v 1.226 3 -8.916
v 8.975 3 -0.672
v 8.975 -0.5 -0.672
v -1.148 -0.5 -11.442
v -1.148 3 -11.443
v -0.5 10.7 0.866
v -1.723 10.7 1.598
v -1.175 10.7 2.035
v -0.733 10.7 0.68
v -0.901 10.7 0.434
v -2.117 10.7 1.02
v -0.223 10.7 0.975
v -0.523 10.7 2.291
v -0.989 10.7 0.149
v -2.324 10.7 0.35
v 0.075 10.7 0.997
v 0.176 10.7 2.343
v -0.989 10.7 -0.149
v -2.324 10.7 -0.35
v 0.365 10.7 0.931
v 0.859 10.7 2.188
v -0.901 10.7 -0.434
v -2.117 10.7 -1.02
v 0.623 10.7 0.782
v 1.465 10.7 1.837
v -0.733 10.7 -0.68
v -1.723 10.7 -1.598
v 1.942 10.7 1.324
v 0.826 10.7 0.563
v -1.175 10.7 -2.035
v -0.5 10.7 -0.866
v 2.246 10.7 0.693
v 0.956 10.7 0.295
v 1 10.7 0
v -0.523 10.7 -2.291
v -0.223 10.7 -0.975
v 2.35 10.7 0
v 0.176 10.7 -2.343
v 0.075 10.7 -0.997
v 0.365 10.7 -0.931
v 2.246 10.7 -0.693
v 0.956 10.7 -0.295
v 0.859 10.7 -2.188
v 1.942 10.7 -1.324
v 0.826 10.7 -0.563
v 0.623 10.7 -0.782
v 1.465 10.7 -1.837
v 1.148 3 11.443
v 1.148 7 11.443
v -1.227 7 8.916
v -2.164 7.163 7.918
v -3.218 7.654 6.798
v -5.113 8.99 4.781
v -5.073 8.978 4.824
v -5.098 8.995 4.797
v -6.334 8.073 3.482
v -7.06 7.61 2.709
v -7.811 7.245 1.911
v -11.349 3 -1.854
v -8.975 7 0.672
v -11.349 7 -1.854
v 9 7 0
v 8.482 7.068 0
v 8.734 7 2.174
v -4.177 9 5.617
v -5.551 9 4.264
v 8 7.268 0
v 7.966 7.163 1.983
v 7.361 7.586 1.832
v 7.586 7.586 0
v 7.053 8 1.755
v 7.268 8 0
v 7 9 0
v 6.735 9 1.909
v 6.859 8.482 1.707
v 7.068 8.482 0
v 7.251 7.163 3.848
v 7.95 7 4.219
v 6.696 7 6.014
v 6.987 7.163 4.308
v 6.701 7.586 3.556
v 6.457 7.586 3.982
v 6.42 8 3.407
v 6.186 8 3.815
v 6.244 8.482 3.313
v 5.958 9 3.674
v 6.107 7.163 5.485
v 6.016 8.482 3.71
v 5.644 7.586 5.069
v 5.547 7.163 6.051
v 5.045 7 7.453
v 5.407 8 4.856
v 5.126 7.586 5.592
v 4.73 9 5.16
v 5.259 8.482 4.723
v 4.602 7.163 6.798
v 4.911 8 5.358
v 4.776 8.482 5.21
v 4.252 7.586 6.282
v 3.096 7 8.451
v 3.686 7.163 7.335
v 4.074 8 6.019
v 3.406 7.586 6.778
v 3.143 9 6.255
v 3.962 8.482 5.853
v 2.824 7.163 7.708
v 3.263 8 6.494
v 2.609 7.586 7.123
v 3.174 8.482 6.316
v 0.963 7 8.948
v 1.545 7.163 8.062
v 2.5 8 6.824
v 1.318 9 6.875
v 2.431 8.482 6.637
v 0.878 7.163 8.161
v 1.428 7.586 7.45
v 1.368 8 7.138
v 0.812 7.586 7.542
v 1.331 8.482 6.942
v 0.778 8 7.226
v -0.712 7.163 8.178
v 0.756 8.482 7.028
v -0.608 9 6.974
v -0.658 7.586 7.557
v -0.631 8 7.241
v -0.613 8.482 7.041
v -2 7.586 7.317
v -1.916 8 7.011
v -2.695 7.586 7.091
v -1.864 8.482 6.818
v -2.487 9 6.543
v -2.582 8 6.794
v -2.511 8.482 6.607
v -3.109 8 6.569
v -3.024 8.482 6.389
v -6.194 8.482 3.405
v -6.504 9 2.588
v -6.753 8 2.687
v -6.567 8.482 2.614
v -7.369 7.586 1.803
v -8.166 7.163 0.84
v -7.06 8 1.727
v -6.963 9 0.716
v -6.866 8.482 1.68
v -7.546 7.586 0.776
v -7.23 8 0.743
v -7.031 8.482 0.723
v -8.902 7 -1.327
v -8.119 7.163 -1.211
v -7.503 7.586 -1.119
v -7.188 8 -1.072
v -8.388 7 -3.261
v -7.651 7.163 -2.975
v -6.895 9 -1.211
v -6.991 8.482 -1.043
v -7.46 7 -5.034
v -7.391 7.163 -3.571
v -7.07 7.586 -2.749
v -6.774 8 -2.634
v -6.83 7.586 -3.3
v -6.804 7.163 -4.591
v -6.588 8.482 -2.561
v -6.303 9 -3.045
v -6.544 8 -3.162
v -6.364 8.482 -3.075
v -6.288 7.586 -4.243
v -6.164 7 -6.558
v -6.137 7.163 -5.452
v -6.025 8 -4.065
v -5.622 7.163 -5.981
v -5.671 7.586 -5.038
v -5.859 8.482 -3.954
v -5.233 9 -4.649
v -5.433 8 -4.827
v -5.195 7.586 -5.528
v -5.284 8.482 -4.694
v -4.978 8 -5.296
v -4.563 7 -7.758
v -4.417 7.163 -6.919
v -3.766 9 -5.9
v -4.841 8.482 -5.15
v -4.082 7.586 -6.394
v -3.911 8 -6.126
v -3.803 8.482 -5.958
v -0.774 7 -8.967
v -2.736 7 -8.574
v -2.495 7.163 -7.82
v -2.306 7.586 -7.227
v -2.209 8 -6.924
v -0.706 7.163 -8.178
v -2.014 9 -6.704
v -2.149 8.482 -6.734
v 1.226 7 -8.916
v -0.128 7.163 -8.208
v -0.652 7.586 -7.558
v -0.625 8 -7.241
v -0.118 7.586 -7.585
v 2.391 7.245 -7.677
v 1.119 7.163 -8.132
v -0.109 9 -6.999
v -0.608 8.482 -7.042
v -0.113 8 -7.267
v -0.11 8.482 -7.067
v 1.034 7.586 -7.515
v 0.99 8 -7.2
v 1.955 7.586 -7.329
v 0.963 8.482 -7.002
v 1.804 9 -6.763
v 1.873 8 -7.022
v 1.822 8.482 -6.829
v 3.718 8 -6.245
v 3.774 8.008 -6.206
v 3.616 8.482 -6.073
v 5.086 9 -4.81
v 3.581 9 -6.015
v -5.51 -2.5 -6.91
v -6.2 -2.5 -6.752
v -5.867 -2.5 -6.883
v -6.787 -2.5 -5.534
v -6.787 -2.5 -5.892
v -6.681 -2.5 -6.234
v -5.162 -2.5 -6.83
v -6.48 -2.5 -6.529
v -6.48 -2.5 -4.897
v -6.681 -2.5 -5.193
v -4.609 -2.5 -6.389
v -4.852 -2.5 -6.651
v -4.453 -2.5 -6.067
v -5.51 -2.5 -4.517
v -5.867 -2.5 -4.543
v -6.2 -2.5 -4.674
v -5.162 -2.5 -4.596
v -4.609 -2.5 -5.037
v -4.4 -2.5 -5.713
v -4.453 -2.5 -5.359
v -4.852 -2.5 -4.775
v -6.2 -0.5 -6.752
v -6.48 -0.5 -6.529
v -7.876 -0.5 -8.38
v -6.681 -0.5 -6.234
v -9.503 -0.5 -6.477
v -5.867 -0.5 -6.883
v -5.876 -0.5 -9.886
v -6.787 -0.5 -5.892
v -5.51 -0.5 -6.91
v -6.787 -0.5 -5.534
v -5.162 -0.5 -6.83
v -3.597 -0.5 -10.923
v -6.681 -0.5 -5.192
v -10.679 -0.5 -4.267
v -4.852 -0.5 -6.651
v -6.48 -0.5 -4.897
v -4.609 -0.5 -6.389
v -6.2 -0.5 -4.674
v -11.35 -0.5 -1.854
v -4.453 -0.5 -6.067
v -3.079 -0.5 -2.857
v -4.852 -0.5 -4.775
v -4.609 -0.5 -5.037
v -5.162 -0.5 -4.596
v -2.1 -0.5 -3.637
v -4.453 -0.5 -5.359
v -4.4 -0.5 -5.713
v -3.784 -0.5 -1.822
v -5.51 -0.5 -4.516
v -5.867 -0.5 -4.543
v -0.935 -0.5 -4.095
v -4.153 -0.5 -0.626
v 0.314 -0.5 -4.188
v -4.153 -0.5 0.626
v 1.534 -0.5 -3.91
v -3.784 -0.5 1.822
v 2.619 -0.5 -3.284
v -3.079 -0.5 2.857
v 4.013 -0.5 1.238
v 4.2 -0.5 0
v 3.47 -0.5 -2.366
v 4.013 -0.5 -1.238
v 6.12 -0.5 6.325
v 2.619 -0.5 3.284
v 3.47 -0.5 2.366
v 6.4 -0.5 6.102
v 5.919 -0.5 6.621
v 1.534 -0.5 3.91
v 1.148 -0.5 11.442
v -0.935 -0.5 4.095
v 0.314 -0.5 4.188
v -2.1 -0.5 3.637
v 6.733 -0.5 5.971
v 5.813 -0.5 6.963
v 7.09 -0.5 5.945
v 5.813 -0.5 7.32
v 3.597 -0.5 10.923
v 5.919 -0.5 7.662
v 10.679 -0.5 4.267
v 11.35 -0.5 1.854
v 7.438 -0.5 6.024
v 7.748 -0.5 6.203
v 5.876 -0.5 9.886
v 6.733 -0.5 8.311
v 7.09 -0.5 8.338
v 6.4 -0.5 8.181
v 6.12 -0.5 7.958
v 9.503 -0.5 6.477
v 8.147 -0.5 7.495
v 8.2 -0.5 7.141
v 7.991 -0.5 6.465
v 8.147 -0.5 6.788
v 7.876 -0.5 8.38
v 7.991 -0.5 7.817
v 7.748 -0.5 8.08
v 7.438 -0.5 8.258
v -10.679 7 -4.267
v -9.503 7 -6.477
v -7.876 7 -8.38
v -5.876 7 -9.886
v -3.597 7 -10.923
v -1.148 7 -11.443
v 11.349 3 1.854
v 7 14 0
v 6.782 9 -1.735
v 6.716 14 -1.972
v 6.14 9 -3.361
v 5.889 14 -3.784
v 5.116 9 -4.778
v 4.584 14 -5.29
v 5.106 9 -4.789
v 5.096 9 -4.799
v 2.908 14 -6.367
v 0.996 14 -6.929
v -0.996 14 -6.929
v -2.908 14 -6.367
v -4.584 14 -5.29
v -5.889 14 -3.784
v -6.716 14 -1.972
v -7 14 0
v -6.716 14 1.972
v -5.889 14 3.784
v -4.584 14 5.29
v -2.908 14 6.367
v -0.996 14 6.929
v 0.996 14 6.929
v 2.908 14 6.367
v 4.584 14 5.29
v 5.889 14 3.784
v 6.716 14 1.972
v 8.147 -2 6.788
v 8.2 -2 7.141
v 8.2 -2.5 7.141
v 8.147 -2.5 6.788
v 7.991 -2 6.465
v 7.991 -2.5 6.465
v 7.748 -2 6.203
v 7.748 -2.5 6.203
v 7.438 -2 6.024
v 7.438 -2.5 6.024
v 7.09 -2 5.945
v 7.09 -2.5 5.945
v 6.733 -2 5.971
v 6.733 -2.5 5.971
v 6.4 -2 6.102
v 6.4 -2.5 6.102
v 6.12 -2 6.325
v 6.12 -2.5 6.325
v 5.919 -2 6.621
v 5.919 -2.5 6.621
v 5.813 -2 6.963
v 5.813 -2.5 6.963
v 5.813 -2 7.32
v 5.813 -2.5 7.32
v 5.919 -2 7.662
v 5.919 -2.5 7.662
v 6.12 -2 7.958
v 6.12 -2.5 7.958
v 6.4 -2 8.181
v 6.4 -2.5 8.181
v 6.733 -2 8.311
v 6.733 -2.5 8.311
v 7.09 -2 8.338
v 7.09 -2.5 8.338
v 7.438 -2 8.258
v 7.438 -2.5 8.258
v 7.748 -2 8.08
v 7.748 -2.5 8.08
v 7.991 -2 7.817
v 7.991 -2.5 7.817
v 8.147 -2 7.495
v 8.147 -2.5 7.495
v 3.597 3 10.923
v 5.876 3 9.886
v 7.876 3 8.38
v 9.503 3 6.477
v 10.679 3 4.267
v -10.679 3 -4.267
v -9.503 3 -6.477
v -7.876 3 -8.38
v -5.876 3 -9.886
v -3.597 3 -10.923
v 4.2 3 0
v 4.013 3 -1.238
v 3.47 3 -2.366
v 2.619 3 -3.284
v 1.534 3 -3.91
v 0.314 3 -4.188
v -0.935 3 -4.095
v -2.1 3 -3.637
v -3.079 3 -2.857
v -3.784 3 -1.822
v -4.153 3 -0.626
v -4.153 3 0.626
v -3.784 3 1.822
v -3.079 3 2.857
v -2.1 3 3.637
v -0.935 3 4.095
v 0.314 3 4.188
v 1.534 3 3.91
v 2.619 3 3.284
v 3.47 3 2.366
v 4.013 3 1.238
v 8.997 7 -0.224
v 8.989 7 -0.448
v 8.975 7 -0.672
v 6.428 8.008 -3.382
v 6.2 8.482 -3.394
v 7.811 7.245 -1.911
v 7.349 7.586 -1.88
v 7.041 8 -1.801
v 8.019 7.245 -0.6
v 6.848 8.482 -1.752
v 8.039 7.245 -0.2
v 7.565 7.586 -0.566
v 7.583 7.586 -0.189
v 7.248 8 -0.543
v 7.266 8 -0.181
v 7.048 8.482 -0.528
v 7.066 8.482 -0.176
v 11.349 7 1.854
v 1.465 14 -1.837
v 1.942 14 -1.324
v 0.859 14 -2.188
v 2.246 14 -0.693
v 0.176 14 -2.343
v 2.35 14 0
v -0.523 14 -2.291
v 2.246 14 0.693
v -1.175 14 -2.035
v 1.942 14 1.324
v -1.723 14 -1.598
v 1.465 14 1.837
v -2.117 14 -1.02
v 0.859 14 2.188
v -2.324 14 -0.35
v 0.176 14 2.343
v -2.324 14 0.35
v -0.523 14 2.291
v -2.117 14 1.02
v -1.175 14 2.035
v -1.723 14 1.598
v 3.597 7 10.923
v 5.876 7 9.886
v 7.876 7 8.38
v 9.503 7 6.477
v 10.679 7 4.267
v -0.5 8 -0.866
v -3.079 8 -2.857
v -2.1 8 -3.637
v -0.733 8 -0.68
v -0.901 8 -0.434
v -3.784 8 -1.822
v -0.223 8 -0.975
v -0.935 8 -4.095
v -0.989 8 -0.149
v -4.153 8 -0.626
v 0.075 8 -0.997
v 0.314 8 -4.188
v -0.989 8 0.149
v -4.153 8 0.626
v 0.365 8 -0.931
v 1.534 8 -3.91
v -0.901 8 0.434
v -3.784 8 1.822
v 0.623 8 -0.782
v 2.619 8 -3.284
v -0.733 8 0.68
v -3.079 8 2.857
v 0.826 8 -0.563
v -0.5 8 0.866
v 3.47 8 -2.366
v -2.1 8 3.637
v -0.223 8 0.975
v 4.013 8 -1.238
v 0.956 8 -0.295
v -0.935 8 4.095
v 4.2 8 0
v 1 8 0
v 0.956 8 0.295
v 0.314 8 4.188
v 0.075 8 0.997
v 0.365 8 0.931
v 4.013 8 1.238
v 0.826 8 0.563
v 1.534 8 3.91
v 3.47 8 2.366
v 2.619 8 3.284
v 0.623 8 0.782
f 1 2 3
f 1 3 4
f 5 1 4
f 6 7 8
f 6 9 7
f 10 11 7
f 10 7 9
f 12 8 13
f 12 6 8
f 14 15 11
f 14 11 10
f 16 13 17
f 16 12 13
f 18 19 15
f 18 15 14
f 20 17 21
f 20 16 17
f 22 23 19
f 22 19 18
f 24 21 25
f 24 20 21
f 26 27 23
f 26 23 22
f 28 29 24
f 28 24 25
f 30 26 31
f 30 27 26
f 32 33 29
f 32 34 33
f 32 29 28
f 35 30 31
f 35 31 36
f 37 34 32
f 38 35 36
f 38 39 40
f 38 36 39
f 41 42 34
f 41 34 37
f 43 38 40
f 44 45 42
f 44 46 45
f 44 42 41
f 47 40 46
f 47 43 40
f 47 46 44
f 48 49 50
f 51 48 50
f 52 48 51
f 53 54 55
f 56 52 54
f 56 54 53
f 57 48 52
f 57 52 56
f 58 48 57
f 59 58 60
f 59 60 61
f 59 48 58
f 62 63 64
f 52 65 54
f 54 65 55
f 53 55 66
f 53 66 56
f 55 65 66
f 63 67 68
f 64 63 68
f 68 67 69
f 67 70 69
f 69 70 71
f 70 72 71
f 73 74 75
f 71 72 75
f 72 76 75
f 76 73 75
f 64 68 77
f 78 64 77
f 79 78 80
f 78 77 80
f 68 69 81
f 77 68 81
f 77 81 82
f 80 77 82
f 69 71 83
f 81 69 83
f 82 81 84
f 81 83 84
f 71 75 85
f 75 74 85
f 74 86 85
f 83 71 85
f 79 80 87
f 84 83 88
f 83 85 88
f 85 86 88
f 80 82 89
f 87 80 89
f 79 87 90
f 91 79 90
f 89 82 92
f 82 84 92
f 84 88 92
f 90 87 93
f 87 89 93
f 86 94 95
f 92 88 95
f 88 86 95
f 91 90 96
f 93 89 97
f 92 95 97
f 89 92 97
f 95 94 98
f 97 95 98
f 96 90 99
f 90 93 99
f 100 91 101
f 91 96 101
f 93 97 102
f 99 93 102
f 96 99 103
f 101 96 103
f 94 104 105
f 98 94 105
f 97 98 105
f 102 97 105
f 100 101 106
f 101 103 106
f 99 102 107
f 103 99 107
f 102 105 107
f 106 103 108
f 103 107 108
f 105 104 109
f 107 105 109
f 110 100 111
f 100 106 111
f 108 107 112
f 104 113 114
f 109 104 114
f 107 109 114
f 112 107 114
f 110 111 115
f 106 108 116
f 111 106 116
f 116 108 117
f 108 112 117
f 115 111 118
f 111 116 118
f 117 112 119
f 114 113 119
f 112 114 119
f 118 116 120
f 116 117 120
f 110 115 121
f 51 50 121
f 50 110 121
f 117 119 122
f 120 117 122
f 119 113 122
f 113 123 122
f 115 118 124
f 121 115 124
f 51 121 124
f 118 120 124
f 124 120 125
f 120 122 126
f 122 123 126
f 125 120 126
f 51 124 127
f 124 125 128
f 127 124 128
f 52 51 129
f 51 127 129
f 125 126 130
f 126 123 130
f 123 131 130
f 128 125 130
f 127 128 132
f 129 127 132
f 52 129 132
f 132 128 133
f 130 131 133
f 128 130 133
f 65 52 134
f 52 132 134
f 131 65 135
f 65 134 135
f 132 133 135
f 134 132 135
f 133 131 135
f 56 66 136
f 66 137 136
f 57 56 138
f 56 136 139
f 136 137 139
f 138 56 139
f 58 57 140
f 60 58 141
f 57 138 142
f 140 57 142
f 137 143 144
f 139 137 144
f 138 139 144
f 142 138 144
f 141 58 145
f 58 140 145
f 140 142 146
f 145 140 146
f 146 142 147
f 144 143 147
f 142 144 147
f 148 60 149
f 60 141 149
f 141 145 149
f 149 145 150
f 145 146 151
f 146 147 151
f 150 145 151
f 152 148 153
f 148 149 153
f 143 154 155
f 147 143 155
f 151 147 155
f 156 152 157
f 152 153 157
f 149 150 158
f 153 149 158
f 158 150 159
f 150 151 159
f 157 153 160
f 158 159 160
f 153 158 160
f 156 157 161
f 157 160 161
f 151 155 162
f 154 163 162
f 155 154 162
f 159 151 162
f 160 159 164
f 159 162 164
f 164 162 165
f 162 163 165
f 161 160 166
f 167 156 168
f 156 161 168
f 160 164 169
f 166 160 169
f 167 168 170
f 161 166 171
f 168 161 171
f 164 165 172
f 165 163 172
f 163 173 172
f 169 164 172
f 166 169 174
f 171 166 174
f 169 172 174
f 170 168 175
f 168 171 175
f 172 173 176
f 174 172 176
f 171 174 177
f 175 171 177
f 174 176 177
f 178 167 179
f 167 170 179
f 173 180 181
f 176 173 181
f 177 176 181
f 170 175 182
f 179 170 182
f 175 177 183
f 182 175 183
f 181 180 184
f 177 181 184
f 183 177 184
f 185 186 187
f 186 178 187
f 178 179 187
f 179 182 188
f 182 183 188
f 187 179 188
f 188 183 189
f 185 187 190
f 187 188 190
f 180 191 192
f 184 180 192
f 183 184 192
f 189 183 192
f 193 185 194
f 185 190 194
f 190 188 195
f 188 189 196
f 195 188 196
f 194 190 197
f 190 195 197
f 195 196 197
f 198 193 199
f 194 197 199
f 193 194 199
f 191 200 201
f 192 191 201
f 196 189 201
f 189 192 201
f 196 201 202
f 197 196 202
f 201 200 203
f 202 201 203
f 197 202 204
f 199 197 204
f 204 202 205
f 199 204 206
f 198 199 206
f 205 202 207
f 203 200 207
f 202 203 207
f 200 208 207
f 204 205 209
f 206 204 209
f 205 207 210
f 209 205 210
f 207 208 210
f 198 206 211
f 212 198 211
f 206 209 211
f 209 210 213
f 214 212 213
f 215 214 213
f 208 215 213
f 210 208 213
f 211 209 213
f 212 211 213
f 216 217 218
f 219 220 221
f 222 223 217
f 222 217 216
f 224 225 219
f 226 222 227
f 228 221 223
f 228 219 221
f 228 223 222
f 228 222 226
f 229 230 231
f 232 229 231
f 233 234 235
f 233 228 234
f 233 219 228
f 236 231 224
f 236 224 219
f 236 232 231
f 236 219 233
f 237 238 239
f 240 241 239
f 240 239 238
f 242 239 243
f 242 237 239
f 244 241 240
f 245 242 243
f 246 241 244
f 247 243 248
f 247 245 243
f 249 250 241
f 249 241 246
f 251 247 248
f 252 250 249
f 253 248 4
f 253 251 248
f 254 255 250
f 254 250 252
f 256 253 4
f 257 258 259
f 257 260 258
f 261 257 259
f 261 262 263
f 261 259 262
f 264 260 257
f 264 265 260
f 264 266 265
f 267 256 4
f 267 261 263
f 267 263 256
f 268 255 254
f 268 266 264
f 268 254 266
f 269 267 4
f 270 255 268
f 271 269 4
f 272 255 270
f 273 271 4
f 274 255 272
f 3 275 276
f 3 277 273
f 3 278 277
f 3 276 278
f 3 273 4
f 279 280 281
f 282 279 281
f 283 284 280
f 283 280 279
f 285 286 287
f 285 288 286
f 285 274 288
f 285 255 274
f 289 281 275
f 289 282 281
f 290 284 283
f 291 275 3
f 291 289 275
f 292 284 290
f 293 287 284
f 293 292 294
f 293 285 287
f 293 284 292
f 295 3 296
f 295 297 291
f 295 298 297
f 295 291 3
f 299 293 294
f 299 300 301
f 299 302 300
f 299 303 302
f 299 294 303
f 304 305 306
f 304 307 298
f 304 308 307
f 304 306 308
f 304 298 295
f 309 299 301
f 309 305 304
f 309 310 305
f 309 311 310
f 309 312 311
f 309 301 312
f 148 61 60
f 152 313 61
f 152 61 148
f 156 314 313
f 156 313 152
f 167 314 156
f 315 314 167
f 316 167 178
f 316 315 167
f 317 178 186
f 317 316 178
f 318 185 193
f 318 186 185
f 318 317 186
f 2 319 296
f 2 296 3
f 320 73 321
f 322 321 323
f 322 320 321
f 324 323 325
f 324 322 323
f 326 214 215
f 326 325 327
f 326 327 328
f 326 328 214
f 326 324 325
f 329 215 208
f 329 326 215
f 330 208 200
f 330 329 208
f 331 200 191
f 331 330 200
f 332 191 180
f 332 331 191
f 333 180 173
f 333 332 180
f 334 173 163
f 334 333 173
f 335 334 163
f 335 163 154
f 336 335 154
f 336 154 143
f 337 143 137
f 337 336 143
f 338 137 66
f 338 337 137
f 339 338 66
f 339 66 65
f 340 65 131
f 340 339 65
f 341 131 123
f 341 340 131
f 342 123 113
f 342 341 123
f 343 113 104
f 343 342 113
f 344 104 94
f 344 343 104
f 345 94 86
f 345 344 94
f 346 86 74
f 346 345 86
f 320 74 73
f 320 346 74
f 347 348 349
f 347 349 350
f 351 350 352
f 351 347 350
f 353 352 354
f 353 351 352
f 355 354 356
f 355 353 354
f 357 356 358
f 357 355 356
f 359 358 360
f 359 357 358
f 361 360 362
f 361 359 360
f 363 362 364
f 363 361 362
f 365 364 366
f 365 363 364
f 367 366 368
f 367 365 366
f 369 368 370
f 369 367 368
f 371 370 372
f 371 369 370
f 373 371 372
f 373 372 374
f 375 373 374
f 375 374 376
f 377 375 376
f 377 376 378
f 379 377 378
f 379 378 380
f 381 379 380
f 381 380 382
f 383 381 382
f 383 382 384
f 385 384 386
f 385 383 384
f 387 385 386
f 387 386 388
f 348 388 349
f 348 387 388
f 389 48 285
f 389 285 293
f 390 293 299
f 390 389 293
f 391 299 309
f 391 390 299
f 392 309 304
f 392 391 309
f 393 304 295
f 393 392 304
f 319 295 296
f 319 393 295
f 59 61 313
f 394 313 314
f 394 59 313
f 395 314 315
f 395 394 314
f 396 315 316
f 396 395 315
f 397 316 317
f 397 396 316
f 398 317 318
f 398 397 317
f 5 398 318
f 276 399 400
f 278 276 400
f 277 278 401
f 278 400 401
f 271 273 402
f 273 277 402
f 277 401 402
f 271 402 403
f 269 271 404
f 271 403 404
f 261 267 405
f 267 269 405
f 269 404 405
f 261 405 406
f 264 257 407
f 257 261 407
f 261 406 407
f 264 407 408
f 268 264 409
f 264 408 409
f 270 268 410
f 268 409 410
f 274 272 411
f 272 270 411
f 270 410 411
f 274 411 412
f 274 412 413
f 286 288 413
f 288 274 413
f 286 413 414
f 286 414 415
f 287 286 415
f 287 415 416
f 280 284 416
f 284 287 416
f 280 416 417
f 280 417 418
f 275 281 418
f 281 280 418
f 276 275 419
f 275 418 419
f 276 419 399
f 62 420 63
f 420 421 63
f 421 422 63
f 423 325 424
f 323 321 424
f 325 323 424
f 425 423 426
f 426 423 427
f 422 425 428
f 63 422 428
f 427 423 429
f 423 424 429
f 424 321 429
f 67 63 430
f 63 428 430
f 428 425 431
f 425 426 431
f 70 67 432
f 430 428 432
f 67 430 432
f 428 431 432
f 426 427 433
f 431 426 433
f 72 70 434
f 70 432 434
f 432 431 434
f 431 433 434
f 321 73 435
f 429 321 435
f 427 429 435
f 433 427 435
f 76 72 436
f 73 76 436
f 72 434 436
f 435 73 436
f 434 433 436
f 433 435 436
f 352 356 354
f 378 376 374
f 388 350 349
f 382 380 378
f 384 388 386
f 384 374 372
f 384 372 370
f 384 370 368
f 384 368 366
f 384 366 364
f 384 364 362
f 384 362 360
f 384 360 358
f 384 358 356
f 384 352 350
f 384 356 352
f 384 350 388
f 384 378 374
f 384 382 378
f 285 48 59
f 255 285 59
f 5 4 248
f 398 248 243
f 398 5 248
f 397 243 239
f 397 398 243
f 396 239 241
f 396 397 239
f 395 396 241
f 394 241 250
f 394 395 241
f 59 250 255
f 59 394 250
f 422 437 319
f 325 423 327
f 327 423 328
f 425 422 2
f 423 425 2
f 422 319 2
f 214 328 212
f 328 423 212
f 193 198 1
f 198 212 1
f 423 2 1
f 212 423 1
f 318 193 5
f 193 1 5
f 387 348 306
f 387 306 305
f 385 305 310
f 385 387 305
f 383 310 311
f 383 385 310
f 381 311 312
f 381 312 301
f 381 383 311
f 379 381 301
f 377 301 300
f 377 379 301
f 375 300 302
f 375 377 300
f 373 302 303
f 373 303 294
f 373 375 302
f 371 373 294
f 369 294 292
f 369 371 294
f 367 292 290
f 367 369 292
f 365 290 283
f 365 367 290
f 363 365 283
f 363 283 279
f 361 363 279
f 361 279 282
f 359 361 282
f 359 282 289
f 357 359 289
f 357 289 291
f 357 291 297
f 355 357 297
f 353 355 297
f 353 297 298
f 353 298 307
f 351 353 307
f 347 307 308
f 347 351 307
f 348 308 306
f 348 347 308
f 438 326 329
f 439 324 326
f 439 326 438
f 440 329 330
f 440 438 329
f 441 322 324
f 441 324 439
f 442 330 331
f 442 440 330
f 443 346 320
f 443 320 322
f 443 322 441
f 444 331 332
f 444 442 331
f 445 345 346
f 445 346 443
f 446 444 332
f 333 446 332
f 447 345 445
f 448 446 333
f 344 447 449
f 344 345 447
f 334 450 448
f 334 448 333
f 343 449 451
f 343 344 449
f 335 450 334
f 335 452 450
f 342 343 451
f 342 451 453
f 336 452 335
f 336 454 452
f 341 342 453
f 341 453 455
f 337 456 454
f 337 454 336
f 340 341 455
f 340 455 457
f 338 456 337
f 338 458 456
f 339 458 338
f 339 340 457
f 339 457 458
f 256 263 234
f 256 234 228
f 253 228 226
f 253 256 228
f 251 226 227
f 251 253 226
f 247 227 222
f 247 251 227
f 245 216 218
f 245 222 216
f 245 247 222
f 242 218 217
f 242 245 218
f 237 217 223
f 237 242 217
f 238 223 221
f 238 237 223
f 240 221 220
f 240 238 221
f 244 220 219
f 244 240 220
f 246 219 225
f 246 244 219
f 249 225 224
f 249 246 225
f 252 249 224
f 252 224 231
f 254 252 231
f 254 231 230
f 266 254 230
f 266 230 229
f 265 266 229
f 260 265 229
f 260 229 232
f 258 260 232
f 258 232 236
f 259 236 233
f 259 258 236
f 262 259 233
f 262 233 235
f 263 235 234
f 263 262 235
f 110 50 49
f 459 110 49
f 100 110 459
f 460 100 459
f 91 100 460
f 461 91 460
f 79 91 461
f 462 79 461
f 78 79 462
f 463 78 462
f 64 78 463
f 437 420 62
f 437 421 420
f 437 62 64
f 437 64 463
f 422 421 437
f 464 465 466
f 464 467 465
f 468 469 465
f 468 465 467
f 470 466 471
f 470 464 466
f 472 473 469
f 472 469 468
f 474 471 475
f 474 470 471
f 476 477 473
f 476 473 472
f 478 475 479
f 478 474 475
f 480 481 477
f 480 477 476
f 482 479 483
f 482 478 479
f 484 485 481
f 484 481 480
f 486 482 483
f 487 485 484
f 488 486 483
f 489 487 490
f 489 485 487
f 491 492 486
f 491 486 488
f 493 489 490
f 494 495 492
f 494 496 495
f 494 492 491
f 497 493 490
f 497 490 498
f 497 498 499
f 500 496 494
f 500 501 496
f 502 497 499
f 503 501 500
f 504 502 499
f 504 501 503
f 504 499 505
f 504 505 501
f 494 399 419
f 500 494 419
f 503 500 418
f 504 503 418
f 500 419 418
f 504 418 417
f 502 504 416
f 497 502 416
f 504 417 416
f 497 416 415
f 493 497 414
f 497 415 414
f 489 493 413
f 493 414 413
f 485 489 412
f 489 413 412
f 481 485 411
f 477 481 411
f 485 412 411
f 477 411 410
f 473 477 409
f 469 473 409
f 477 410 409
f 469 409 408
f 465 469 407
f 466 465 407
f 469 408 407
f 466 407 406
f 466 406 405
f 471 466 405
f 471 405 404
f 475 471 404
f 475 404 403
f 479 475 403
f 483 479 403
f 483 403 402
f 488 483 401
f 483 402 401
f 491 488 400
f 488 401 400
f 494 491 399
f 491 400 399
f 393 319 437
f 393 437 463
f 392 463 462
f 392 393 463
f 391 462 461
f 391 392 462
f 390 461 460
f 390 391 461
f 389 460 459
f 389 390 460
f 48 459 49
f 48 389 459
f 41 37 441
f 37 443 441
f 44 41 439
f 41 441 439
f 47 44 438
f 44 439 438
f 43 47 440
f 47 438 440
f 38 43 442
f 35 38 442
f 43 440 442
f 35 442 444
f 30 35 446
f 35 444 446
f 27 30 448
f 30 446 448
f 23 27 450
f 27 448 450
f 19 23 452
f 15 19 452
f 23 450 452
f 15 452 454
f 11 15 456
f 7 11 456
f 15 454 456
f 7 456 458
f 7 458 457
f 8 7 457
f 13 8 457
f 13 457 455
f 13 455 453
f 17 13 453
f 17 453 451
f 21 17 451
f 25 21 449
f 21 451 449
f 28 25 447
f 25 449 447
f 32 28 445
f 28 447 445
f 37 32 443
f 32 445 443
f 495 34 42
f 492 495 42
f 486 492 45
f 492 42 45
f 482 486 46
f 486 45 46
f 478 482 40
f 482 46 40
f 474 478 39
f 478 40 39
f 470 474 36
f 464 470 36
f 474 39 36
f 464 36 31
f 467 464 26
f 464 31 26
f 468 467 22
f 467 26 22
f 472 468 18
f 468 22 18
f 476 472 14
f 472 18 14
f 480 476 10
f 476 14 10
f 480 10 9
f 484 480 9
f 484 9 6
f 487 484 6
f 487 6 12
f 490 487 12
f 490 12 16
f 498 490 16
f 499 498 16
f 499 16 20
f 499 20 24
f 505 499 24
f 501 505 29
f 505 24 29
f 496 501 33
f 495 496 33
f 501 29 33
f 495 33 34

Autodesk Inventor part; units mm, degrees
ref_plane "YZ Plane" through (0, 0, 0) normal (1, 0, 0) x (0, 1, 0)
ref_plane "XZ Plane" through (0, 0, 0) normal (0, 1, 0) x (-1, 0, 0)
ref_plane "XY Plane" through (0, 0, 0) normal (0, 0, 1) x (1, 0, 0)
sketch "Skizze1" plane through (0, 0, 0) normal (0, 1, 0) x (-1, 0, 0)
  circle A0 centre (0, 0) radius 15
  dimension "d0" = 30
extrude "Extrusion1" add sketch "Skizze1" along normal blind 14
sketch "Skizze2" plane through (0, 0, 0) normal (0, -1, 0) x (1, 0, 0)
  line L0 (14.3188, 0.9) -> (12.9688, 0.9)
  line L1 (12.9688, -0.9) -> (14.3188, -0.9)
  line L2 (14.3188, -0.9) -> (14.3188, 0.9)
  line L3 (-21.3175, 0) -> (21.3175, 0) projected
  arc A0 (12.9688, 0.9) -> (0.9, 12.9688) centre (0, 0) ccw
  line L4 (-0.9, -12.9688) -> (-0.9, -14.3188)
  line L5 (-0.9, -14.3188) -> (0.9, -14.3188)
  line L6 (0.9, -14.3188) -> (0.9, -12.9688)
  line L7 (-12.9688, 0.9) -> (-14.3188, 0.9)
  line L8 (-14.3188, 0.9) -> (-14.3188, -0.9)
  line L9 (-14.3188, -0.9) -> (-12.9688, -0.9)
  line L10 (-0.9, 12.9688) -> (-0.9, 14.3188)
  line L11 (-0.9, 14.3188) -> (0.9, 14.3188)
  line L12 (0.9, 14.3188) -> (0.9, 12.9688)
  line L13 (0, -21.3175) -> (0, 21.3175) projected
  line L14 (-21.3175, 0) -> (21.3175, 0) projected
  arc A1 (0.9, -12.9688) -> (12.9688, -0.9) centre (0, 0) ccw
  arc A2 (-12.9688, -0.9) -> (-0.9, -12.9688) centre (0, 0) ccw
  arc A3 (-0.9, 12.9688) -> (-12.9688, 0.9) centre (0, 0) ccw
  circle A4 centre (0, 0) radius 4.2
  circle A5 centre (7, 7.1414) radius 1.2
  circle A6 centre (-5.6, -5.7131) radius 1.2
  dimension "d4" = 0.9
  dimension "d5" = 0.9
  dimension "d8" = 1.35
  dimension "d9" = 1.35
  dimension "d10" = 1.8
  dimension "d11" = 0.9
  dimension "d12" = 1.35
  dimension "d13" = 1.8
  dimension "d14" = 0.9
  dimension "d15" = 0.9
  dimension "d16" = 1.35
  dimension "d17" = 8.4
  dimension "d18" = 2.4
  dimension "d19" = 2.4
  dimension "d20" = 8
  dimension "d21" = 10
  dimension "d22" = 7
  dimension "d23" = 5.6
  dimension "d50" = 13
  dimension "d51" = 13
  dimension "d52" = 1.35
  dimension "d53" = 1.35
  dimension "d54" = 1.35
extrude "Extrusion2" cut sketch "Skizze2" against normal blind 3 contours L2 L3 A4 L13 L11 L12 A0 L0 | L2 L1 A1 L6 L5 L13 A4 L3 | A4 L3 L8 L7 A3 L10 L11 L13 | L13 L5 L4 A2 L9 L8 L3 A4
sketch "Skizze4" plane through (7, 0, 7.1414) normal (0, -1, 0) x (1, 0, 0)
  circle A0 centre (-7, -7.1414) radius 4.2
  circle A1 centre (-12.6, -12.8546) radius 1.2
  circle A2 centre (0, 0) radius 1.2
  line L0 (-7, -28.1414) -> (-7, 13.8586) projected
  dimension "d26" = 2.4
  dimension "d27" = 5.6
  dimension "d28" = 8
  dimension "d44" = 8.4
  dimension "d45" = 2.4
extrude "Extrusion3" add sketch "Skizze4" along normal blind 2
sketch "Skizze5" plane through (0, 14, 0) normal (0, 1, 0) x (1, 0, 0)
  circle A0 centre (0, 0) radius 19.262
  circle A1 centre (0, 0) radius 7
  dimension "d31" = 14
extrude "Extrusion4" cut sketch "Skizze5" against normal blind 7
fillet "Rundung1" radius 1 8 edges at (12.9688, 1.5, -0.9) (12.9688, 1.5, 0.9) (0.9, 1.5, -12.9688) (-0.9, 1.5, -12.9688) (-12.9688, 1.5, -0.9) (-12.9688, 1.5, 0.9) (-0.9, 1.5, 12.9688) (0.9, 1.5, 12.9688)
sketch "Skizze8" plane through (0, 14, 0) normal (0, 1, 0) x (1, 0, 0)
  circle A0 centre (0, 0) radius 1
  dimension "d46" = 2
extrude "Extrusion7" cut sketch "Skizze8" against normal blind 7
fillet "Rundung2" radius 2 1 edges at (-7, 7, 0)
sketch "Skizze9" plane through (0, -2, 0) normal (0, -1, 0) x (1, 0, 0)
  line L0 (18.2687, 9.2162) -> (-7.478, -18.1772)
  line L1 (-7.478, -18.1772) -> (18.2687, -18.1772)
  line L2 (18.2687, -18.1772) -> (18.2687, 9.2162)
  line L3 (8.0673, 18.8043) -> (-17.6793, -8.5891)
  line L4 (-17.6793, -8.5891) -> (-17.6793, 18.8043)
  line L5 (-17.6793, 18.8043) -> (8.0673, 18.8043)
  point P0 (0, 0)
  dimension "d55" = 7
  dimension "d56" = 7
extrude "Extrusion8" cut sketch "Skizze9" against normal blind 50
sketch "Skizze10" plane through (0, -2, 0) normal (0, -1, 0) x (1, 0, 0)
  circle A0 centre (0, 0) radius 11.5
  circle A1 centre (0, 0) radius 18.9246
  dimension "d61" = 23
extrude "Extrusion9" cut sketch "Skizze10" against normal blind 10
sketch "Skizze11" plane through (0, -2, 0) normal (0, -1, 0) x (1, 0, 0)
  circle A0 centre (0, 0) radius 1 projected
  circle A1 centre (0, 0) radius 4.2
extrude "Extrusion10" cut sketch "Skizze11" against normal blind 10 contours A0 | A1
sketch "Skizze13" plane through (0, 3, 0) normal (0, -1, 0) x (1, 0, 0)
  circle A0 centre (7, 7.1414) radius 1.2 projected
  circle A1 centre (7, 7.1414) radius 1.2
  circle A2 centre (-5.6, -5.7131) radius 1.2 projected
  circle A3 centre (-5.6, -5.7131) radius 1.2
  arc A4 (11.3495, 1.8544) -> (1.1481, 11.4425) centre (0, 0) ccw
  line L0 (11.3495, 1.8544) -> (8.9749, -0.6721) projected
  line L1 (11.3495, 1.8544) -> (-1.1481, -11.4425)
  line L2 (1.1481, 11.4425) -> (-11.3495, -1.8544)
  line L3 (1.2265, -8.916) -> (-1.1481, -11.4425) projected
  arc A5 (-11.3495, -1.8544) -> (-1.1481, -11.4425) centre (0, 0) ccw
  circle A6 centre (0, 0) radius 4.2
extrude "Extrusion11" add sketch "Skizze13" along normal blind 3.5
sketch "Skizze14" plane through (7, -2, 7.1414) normal (0, -1, 0) x (1, 0, 0)
  circle A0 centre (0, 0) radius 1.2 projected
  circle A1 centre (0, 0) radius 1.2
  circle A2 centre (-12.6, -12.8546) radius 1.2 projected
  circle A3 centre (-12.6, -12.8546) radius 1.2
  point P0 (-7, -7.1414)
extrude "Extrusion12" add sketch "Skizze14" along normal blind 0.5
sketch "Skizze15" plane through (0, 14, 0) normal (0, 1, 0) x (1, 0, 0)
  circle A0 centre (0, 0) radius 1 projected
  circle A1 centre (0, 0) radius 2.35
  dimension "d68" = 4.7
extrude "Extrusion13" cut sketch "Skizze15" against normal blind 3.3 contours A0 | A1
properties part number "Adaptation_on_OPdevside_4_1"
